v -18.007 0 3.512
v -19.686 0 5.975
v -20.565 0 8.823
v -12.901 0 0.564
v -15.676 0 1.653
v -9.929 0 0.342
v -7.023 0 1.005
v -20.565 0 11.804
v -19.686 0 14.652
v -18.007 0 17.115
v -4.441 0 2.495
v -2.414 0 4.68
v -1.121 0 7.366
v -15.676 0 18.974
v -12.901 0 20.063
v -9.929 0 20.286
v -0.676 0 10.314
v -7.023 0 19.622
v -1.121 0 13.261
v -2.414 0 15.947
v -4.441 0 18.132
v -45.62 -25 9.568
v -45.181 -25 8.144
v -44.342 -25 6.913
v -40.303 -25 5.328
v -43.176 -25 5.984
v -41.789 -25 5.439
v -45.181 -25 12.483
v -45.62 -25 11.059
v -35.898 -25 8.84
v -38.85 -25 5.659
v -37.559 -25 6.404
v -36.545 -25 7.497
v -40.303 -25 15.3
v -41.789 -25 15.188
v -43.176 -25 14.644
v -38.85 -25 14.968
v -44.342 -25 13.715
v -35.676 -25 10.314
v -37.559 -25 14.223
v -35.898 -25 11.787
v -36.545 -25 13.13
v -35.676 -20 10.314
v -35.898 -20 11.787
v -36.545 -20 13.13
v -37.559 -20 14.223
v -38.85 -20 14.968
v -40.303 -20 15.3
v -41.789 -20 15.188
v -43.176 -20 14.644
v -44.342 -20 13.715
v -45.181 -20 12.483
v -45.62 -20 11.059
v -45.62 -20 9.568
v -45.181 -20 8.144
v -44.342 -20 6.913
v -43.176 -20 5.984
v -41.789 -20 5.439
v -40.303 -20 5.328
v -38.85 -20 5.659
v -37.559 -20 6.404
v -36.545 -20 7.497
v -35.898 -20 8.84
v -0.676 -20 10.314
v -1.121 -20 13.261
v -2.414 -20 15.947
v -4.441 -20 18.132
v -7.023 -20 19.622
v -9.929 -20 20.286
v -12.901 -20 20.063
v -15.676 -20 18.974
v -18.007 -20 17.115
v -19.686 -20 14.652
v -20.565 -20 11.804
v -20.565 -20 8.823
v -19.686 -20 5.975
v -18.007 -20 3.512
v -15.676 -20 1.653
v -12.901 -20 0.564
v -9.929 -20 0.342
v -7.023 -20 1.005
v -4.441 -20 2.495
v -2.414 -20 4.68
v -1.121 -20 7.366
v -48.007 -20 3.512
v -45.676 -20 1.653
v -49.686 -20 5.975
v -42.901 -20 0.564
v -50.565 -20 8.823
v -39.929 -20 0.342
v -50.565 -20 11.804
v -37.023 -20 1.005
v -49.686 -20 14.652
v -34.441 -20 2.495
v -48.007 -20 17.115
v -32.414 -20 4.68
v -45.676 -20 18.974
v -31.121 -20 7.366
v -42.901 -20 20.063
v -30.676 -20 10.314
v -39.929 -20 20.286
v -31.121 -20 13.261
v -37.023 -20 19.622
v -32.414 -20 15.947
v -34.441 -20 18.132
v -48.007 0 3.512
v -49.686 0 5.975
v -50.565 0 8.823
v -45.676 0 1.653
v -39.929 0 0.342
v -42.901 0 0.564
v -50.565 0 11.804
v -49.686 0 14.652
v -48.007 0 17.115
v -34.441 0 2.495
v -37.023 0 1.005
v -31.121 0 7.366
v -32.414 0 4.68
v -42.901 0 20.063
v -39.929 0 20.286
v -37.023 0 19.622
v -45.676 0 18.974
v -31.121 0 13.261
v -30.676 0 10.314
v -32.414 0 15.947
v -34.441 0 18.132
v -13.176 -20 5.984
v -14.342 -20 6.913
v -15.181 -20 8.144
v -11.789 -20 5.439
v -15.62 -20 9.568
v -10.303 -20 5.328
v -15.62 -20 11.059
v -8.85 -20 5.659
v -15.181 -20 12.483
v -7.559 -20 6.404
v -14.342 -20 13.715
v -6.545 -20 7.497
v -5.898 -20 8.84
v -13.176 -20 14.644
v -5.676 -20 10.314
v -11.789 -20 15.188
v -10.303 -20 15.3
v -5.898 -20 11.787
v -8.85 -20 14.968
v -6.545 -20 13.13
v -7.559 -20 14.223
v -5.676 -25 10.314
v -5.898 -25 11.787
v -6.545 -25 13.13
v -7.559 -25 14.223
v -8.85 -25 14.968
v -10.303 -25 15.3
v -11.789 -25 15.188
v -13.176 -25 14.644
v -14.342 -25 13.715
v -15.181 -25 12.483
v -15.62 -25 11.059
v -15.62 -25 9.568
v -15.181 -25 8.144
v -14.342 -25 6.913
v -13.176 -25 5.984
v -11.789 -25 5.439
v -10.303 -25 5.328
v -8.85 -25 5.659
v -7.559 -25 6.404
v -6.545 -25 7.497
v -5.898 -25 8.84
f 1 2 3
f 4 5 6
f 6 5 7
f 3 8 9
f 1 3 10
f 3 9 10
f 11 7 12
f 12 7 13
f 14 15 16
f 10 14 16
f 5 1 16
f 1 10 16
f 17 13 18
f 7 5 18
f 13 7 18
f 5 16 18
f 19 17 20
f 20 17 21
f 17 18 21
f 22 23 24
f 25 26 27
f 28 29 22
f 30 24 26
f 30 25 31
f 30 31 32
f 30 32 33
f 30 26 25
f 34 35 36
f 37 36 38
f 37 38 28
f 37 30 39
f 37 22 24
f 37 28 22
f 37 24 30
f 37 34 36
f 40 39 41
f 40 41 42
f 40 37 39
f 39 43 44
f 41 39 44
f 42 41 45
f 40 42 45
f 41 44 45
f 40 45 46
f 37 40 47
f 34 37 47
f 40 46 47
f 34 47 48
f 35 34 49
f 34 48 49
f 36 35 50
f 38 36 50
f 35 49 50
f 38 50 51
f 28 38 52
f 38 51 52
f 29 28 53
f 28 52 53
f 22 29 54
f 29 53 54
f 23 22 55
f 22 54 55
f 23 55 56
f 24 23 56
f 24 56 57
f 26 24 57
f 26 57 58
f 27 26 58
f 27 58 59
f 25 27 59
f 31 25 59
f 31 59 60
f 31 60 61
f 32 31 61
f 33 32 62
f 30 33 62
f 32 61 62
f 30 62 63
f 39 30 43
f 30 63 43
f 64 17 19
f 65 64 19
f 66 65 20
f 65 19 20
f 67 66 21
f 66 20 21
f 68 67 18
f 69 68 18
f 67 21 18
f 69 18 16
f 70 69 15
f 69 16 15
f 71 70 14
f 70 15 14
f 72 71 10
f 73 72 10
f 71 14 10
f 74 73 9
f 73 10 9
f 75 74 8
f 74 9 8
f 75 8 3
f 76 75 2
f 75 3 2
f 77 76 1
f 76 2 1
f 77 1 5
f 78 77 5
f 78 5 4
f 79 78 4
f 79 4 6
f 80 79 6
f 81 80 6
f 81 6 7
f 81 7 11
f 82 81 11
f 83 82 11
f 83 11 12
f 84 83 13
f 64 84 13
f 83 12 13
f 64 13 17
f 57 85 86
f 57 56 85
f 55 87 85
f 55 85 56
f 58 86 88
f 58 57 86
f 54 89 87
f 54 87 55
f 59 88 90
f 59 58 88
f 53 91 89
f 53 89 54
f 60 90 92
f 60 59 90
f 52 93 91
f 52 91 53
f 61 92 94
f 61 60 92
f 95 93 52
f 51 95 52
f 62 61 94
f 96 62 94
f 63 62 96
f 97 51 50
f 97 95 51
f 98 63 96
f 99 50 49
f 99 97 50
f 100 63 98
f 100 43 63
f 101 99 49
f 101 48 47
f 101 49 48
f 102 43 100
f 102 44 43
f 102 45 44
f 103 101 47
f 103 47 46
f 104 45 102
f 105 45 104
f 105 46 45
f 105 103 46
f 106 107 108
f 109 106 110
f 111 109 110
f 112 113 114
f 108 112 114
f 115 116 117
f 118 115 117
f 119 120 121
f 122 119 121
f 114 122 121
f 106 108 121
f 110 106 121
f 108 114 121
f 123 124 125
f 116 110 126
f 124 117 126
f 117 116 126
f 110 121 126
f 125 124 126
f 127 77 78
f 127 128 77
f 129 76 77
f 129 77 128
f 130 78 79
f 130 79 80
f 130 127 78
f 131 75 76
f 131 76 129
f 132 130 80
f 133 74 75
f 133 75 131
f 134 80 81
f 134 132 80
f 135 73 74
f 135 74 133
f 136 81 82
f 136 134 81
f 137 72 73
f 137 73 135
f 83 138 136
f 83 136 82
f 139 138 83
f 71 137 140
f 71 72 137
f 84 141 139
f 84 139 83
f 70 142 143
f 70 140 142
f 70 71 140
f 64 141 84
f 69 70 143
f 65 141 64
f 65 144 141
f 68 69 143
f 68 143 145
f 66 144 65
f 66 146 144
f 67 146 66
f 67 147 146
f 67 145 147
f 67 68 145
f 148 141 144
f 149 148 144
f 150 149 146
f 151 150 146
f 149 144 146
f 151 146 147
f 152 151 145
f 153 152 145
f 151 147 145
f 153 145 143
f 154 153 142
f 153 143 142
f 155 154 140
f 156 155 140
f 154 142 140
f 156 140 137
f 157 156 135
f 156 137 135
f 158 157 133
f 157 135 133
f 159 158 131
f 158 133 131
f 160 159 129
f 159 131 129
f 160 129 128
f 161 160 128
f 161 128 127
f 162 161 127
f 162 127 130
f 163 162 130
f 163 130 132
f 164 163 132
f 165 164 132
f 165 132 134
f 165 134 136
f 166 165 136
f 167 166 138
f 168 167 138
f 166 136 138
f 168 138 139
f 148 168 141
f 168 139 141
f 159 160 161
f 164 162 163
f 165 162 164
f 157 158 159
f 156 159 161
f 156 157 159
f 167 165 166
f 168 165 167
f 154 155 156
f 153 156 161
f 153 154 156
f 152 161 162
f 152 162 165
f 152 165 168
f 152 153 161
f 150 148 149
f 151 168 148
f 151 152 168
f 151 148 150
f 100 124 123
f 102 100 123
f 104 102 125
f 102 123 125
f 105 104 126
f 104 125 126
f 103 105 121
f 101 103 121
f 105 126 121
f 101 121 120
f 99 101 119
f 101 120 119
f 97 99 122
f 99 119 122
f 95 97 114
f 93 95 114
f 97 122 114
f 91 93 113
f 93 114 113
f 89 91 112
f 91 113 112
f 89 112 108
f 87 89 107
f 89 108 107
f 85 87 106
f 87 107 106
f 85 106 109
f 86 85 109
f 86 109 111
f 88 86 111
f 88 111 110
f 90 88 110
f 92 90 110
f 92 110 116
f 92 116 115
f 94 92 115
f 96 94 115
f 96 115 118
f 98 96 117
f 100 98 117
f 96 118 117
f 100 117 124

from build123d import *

# Parameters (mm, degrees)
F0_R     = 10
F1_DEPTH = 20
F2_R     = 5
F3_DEPTH = 5
F4_R     = 5
F5_DEPTH = 5


with BuildPart() as f1:
    # F0 (on Front) → F1 (new body)
    with BuildSketch(Plane.XZ):
        with Locations((-40.676259, 10.313648)):
            Circle(F0_R)
        with Locations((-10.676259, 10.313648)):
            Circle(F0_R)
    extrude(amount=F1_DEPTH)

    # F2 (on face) → F3 (join)
    with BuildSketch(Plane.XZ.offset(20)):
        with Locations((-40.676259, 10.313648)):
            Circle(F2_R)
    extrude(amount=F3_DEPTH)

    # F4 (on face) → F5 (join)
    with BuildSketch(Plane.XZ.offset(20)):
        with Locations((-10.676259, 10.313648)):
            Circle(F4_R)
    extrude(amount=F5_DEPTH)


solid = f1.part
